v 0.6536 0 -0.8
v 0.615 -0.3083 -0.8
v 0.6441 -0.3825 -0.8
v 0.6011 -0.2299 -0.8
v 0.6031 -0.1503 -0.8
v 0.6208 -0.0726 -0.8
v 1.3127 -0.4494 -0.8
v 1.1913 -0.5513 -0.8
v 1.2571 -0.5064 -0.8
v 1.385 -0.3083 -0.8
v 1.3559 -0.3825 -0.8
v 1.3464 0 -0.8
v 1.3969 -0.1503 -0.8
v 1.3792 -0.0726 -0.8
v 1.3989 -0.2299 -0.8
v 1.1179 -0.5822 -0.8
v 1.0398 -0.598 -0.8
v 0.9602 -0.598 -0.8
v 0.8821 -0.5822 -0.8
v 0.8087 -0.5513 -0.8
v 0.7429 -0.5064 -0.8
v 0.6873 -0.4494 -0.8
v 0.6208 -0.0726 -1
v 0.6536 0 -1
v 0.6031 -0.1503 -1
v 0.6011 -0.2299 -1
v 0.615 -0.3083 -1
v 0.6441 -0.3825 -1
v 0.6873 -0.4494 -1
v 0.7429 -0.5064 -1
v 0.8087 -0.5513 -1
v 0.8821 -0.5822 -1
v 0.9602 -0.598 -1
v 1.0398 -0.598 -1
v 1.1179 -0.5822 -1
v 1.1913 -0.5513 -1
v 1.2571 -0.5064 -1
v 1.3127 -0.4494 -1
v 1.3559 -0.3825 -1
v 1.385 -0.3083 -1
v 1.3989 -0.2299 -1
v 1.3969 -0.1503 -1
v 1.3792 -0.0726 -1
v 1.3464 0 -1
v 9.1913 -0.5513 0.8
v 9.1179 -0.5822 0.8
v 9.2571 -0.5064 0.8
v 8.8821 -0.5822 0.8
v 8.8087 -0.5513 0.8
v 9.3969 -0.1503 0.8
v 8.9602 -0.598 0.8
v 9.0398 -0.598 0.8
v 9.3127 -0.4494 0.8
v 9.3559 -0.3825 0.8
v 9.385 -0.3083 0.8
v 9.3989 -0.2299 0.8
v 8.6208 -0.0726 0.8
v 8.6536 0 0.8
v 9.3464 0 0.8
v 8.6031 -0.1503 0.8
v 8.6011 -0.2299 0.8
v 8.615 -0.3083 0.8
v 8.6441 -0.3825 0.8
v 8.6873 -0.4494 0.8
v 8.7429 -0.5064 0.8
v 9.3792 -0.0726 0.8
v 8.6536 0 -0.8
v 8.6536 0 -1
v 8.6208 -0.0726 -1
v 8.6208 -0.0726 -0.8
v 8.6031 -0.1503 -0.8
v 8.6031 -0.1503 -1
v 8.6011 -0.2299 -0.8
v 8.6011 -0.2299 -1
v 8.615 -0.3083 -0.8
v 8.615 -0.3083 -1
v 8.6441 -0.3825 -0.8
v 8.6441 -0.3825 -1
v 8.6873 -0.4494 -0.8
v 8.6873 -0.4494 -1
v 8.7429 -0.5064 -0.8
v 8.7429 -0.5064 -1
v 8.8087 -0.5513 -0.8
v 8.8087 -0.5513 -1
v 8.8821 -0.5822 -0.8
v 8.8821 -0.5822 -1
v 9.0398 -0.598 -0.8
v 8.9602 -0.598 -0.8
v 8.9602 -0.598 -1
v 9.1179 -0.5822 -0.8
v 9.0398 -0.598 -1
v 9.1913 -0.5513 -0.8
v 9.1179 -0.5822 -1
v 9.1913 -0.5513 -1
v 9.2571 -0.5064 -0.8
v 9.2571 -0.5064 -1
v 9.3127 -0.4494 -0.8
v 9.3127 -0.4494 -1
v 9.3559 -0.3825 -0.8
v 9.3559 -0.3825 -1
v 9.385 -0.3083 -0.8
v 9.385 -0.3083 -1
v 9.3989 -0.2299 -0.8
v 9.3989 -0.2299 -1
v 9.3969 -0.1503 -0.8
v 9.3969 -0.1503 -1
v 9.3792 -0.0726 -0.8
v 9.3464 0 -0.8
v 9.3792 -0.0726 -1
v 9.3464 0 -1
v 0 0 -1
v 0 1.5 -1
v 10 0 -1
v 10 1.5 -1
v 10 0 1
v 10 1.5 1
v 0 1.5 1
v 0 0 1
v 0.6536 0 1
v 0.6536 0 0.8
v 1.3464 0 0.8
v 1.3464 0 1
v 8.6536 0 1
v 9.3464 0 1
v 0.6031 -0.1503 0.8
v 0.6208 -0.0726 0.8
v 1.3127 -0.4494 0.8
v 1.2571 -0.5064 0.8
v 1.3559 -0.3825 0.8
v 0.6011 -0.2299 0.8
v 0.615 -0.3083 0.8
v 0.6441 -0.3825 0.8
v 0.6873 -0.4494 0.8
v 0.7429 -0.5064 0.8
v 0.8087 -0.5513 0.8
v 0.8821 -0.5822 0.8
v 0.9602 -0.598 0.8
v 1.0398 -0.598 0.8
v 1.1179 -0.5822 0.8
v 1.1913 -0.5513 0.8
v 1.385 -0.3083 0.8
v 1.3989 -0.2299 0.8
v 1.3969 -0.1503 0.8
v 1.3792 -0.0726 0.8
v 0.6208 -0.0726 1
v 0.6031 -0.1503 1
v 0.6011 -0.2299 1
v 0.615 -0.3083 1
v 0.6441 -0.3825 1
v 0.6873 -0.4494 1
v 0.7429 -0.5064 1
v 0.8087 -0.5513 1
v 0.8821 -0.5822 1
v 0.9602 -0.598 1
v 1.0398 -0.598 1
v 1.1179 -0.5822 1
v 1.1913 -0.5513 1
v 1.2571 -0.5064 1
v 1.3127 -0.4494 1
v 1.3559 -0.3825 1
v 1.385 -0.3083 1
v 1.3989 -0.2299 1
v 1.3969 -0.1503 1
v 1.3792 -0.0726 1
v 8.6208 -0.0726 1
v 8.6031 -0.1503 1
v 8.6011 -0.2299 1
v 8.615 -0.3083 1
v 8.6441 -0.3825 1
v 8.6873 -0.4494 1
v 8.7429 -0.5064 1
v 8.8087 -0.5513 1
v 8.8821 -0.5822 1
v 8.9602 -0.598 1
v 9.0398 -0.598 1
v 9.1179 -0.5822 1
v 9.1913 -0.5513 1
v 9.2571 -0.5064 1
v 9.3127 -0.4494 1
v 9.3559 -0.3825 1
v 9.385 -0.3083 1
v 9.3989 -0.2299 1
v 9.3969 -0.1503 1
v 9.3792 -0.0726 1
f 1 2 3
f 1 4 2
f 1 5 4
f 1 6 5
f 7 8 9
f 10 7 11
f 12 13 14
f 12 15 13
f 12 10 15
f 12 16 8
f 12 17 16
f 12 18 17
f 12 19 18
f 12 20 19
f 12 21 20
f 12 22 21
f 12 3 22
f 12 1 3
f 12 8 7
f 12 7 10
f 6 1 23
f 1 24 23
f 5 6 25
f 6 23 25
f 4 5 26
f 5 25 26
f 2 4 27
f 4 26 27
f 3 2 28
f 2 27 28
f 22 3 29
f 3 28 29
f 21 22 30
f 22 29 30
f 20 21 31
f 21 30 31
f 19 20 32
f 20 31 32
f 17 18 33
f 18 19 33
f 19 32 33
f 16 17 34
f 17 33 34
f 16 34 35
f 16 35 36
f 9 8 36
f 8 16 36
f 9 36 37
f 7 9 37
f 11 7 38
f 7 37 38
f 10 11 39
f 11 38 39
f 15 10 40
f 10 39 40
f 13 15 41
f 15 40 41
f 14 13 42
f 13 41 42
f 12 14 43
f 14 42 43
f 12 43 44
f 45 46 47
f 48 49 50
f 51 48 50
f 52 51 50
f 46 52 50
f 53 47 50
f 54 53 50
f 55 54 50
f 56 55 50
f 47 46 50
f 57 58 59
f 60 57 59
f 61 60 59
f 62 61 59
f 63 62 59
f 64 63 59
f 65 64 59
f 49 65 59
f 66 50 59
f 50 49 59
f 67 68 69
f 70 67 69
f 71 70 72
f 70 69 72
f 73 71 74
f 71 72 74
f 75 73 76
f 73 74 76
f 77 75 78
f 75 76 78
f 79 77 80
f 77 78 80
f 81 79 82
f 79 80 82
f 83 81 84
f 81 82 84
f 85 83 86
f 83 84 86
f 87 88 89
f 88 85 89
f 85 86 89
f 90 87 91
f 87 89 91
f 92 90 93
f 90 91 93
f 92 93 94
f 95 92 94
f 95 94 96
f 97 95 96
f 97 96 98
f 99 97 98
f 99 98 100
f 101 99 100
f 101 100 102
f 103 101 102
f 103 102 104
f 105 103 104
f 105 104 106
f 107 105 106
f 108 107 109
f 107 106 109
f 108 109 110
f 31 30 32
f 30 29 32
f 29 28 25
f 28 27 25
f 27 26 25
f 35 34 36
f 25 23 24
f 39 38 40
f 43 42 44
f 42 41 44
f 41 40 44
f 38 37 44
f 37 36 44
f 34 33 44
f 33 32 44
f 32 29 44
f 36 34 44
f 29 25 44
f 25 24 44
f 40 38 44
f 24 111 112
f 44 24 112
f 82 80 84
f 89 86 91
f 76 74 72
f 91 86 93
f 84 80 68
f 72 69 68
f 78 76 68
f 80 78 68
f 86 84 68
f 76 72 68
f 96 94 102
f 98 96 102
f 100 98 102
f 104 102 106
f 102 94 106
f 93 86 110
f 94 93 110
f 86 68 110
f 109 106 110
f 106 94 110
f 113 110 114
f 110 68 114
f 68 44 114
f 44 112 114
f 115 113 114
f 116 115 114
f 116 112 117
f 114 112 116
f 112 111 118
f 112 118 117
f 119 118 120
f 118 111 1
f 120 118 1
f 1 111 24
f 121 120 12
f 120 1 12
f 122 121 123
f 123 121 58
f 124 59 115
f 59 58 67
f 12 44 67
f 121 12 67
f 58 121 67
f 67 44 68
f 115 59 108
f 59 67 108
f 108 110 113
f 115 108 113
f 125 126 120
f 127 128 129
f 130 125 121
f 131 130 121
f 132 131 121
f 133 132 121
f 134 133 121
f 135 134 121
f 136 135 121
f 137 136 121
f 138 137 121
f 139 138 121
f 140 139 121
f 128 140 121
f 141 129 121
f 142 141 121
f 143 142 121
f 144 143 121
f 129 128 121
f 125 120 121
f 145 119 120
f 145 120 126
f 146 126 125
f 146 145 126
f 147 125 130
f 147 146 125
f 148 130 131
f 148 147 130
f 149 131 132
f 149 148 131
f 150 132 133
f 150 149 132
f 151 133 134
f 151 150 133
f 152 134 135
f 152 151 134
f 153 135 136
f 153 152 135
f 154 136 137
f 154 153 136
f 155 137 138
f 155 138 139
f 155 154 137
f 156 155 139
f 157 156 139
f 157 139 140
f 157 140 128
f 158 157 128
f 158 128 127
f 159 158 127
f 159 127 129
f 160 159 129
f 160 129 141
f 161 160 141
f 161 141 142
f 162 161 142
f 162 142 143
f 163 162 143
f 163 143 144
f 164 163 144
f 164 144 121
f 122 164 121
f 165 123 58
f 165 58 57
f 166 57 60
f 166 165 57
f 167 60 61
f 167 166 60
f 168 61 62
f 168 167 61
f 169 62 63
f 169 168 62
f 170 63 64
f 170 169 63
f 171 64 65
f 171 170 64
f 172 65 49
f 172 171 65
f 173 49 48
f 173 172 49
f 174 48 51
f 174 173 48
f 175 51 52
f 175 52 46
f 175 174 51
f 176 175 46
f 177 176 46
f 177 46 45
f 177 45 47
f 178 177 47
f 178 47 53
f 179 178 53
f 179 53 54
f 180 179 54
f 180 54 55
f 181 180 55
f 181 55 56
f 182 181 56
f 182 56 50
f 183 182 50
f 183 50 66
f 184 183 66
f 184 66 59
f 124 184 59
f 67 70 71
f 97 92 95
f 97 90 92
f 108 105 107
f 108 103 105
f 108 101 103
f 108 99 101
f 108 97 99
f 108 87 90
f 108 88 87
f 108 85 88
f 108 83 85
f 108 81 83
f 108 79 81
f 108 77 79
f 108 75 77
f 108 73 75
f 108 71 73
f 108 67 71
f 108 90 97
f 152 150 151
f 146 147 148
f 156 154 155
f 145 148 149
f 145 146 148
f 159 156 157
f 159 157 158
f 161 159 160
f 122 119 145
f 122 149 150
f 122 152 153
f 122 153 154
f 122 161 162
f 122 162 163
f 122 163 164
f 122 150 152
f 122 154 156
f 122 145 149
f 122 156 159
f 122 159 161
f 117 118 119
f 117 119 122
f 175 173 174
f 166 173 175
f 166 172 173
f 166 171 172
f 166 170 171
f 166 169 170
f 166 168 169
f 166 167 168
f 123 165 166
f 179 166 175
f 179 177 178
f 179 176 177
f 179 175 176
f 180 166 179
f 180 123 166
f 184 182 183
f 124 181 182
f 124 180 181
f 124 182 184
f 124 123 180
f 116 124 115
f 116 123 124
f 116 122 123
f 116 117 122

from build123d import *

# Parameters (mm, degrees)
EXTRUDE_1_DEPTH      = 1
EXTRUDE_1_DEPTH_BACK = 1
SKETCH_1_W           = 10
SKETCH_1_H           = 1.5
SKETCH_2_R           = 0.4
EXTRUDE_2_DEPTH      = 0.2


with BuildPart() as part:
    # 草图1 → 凸台-拉伸1 (new, two sides: drawn at the far end of the back side and taken through both)
    with BuildSketch(Plane.XY.offset(-EXTRUDE_1_DEPTH_BACK)):
        with Locations((5, 0.75)):
            Rectangle(SKETCH_1_W, SKETCH_1_H)
    extrude(amount=EXTRUDE_1_DEPTH + EXTRUDE_1_DEPTH_BACK)

    # 草图2 → 凸台-拉伸2 (add)
    with BuildSketch(Plane.XY.offset(1)):
        with Locations((9, -0.2)):
            Circle(SKETCH_2_R)
        with Locations((1, -0.2)):
            Circle(SKETCH_2_R)
    extrude_2 = extrude(amount=-EXTRUDE_2_DEPTH)

    # 镜向1: 凸台-拉伸2 across plane
    add(extrude_2.mirror(Plane.XY))


solid = part.part
